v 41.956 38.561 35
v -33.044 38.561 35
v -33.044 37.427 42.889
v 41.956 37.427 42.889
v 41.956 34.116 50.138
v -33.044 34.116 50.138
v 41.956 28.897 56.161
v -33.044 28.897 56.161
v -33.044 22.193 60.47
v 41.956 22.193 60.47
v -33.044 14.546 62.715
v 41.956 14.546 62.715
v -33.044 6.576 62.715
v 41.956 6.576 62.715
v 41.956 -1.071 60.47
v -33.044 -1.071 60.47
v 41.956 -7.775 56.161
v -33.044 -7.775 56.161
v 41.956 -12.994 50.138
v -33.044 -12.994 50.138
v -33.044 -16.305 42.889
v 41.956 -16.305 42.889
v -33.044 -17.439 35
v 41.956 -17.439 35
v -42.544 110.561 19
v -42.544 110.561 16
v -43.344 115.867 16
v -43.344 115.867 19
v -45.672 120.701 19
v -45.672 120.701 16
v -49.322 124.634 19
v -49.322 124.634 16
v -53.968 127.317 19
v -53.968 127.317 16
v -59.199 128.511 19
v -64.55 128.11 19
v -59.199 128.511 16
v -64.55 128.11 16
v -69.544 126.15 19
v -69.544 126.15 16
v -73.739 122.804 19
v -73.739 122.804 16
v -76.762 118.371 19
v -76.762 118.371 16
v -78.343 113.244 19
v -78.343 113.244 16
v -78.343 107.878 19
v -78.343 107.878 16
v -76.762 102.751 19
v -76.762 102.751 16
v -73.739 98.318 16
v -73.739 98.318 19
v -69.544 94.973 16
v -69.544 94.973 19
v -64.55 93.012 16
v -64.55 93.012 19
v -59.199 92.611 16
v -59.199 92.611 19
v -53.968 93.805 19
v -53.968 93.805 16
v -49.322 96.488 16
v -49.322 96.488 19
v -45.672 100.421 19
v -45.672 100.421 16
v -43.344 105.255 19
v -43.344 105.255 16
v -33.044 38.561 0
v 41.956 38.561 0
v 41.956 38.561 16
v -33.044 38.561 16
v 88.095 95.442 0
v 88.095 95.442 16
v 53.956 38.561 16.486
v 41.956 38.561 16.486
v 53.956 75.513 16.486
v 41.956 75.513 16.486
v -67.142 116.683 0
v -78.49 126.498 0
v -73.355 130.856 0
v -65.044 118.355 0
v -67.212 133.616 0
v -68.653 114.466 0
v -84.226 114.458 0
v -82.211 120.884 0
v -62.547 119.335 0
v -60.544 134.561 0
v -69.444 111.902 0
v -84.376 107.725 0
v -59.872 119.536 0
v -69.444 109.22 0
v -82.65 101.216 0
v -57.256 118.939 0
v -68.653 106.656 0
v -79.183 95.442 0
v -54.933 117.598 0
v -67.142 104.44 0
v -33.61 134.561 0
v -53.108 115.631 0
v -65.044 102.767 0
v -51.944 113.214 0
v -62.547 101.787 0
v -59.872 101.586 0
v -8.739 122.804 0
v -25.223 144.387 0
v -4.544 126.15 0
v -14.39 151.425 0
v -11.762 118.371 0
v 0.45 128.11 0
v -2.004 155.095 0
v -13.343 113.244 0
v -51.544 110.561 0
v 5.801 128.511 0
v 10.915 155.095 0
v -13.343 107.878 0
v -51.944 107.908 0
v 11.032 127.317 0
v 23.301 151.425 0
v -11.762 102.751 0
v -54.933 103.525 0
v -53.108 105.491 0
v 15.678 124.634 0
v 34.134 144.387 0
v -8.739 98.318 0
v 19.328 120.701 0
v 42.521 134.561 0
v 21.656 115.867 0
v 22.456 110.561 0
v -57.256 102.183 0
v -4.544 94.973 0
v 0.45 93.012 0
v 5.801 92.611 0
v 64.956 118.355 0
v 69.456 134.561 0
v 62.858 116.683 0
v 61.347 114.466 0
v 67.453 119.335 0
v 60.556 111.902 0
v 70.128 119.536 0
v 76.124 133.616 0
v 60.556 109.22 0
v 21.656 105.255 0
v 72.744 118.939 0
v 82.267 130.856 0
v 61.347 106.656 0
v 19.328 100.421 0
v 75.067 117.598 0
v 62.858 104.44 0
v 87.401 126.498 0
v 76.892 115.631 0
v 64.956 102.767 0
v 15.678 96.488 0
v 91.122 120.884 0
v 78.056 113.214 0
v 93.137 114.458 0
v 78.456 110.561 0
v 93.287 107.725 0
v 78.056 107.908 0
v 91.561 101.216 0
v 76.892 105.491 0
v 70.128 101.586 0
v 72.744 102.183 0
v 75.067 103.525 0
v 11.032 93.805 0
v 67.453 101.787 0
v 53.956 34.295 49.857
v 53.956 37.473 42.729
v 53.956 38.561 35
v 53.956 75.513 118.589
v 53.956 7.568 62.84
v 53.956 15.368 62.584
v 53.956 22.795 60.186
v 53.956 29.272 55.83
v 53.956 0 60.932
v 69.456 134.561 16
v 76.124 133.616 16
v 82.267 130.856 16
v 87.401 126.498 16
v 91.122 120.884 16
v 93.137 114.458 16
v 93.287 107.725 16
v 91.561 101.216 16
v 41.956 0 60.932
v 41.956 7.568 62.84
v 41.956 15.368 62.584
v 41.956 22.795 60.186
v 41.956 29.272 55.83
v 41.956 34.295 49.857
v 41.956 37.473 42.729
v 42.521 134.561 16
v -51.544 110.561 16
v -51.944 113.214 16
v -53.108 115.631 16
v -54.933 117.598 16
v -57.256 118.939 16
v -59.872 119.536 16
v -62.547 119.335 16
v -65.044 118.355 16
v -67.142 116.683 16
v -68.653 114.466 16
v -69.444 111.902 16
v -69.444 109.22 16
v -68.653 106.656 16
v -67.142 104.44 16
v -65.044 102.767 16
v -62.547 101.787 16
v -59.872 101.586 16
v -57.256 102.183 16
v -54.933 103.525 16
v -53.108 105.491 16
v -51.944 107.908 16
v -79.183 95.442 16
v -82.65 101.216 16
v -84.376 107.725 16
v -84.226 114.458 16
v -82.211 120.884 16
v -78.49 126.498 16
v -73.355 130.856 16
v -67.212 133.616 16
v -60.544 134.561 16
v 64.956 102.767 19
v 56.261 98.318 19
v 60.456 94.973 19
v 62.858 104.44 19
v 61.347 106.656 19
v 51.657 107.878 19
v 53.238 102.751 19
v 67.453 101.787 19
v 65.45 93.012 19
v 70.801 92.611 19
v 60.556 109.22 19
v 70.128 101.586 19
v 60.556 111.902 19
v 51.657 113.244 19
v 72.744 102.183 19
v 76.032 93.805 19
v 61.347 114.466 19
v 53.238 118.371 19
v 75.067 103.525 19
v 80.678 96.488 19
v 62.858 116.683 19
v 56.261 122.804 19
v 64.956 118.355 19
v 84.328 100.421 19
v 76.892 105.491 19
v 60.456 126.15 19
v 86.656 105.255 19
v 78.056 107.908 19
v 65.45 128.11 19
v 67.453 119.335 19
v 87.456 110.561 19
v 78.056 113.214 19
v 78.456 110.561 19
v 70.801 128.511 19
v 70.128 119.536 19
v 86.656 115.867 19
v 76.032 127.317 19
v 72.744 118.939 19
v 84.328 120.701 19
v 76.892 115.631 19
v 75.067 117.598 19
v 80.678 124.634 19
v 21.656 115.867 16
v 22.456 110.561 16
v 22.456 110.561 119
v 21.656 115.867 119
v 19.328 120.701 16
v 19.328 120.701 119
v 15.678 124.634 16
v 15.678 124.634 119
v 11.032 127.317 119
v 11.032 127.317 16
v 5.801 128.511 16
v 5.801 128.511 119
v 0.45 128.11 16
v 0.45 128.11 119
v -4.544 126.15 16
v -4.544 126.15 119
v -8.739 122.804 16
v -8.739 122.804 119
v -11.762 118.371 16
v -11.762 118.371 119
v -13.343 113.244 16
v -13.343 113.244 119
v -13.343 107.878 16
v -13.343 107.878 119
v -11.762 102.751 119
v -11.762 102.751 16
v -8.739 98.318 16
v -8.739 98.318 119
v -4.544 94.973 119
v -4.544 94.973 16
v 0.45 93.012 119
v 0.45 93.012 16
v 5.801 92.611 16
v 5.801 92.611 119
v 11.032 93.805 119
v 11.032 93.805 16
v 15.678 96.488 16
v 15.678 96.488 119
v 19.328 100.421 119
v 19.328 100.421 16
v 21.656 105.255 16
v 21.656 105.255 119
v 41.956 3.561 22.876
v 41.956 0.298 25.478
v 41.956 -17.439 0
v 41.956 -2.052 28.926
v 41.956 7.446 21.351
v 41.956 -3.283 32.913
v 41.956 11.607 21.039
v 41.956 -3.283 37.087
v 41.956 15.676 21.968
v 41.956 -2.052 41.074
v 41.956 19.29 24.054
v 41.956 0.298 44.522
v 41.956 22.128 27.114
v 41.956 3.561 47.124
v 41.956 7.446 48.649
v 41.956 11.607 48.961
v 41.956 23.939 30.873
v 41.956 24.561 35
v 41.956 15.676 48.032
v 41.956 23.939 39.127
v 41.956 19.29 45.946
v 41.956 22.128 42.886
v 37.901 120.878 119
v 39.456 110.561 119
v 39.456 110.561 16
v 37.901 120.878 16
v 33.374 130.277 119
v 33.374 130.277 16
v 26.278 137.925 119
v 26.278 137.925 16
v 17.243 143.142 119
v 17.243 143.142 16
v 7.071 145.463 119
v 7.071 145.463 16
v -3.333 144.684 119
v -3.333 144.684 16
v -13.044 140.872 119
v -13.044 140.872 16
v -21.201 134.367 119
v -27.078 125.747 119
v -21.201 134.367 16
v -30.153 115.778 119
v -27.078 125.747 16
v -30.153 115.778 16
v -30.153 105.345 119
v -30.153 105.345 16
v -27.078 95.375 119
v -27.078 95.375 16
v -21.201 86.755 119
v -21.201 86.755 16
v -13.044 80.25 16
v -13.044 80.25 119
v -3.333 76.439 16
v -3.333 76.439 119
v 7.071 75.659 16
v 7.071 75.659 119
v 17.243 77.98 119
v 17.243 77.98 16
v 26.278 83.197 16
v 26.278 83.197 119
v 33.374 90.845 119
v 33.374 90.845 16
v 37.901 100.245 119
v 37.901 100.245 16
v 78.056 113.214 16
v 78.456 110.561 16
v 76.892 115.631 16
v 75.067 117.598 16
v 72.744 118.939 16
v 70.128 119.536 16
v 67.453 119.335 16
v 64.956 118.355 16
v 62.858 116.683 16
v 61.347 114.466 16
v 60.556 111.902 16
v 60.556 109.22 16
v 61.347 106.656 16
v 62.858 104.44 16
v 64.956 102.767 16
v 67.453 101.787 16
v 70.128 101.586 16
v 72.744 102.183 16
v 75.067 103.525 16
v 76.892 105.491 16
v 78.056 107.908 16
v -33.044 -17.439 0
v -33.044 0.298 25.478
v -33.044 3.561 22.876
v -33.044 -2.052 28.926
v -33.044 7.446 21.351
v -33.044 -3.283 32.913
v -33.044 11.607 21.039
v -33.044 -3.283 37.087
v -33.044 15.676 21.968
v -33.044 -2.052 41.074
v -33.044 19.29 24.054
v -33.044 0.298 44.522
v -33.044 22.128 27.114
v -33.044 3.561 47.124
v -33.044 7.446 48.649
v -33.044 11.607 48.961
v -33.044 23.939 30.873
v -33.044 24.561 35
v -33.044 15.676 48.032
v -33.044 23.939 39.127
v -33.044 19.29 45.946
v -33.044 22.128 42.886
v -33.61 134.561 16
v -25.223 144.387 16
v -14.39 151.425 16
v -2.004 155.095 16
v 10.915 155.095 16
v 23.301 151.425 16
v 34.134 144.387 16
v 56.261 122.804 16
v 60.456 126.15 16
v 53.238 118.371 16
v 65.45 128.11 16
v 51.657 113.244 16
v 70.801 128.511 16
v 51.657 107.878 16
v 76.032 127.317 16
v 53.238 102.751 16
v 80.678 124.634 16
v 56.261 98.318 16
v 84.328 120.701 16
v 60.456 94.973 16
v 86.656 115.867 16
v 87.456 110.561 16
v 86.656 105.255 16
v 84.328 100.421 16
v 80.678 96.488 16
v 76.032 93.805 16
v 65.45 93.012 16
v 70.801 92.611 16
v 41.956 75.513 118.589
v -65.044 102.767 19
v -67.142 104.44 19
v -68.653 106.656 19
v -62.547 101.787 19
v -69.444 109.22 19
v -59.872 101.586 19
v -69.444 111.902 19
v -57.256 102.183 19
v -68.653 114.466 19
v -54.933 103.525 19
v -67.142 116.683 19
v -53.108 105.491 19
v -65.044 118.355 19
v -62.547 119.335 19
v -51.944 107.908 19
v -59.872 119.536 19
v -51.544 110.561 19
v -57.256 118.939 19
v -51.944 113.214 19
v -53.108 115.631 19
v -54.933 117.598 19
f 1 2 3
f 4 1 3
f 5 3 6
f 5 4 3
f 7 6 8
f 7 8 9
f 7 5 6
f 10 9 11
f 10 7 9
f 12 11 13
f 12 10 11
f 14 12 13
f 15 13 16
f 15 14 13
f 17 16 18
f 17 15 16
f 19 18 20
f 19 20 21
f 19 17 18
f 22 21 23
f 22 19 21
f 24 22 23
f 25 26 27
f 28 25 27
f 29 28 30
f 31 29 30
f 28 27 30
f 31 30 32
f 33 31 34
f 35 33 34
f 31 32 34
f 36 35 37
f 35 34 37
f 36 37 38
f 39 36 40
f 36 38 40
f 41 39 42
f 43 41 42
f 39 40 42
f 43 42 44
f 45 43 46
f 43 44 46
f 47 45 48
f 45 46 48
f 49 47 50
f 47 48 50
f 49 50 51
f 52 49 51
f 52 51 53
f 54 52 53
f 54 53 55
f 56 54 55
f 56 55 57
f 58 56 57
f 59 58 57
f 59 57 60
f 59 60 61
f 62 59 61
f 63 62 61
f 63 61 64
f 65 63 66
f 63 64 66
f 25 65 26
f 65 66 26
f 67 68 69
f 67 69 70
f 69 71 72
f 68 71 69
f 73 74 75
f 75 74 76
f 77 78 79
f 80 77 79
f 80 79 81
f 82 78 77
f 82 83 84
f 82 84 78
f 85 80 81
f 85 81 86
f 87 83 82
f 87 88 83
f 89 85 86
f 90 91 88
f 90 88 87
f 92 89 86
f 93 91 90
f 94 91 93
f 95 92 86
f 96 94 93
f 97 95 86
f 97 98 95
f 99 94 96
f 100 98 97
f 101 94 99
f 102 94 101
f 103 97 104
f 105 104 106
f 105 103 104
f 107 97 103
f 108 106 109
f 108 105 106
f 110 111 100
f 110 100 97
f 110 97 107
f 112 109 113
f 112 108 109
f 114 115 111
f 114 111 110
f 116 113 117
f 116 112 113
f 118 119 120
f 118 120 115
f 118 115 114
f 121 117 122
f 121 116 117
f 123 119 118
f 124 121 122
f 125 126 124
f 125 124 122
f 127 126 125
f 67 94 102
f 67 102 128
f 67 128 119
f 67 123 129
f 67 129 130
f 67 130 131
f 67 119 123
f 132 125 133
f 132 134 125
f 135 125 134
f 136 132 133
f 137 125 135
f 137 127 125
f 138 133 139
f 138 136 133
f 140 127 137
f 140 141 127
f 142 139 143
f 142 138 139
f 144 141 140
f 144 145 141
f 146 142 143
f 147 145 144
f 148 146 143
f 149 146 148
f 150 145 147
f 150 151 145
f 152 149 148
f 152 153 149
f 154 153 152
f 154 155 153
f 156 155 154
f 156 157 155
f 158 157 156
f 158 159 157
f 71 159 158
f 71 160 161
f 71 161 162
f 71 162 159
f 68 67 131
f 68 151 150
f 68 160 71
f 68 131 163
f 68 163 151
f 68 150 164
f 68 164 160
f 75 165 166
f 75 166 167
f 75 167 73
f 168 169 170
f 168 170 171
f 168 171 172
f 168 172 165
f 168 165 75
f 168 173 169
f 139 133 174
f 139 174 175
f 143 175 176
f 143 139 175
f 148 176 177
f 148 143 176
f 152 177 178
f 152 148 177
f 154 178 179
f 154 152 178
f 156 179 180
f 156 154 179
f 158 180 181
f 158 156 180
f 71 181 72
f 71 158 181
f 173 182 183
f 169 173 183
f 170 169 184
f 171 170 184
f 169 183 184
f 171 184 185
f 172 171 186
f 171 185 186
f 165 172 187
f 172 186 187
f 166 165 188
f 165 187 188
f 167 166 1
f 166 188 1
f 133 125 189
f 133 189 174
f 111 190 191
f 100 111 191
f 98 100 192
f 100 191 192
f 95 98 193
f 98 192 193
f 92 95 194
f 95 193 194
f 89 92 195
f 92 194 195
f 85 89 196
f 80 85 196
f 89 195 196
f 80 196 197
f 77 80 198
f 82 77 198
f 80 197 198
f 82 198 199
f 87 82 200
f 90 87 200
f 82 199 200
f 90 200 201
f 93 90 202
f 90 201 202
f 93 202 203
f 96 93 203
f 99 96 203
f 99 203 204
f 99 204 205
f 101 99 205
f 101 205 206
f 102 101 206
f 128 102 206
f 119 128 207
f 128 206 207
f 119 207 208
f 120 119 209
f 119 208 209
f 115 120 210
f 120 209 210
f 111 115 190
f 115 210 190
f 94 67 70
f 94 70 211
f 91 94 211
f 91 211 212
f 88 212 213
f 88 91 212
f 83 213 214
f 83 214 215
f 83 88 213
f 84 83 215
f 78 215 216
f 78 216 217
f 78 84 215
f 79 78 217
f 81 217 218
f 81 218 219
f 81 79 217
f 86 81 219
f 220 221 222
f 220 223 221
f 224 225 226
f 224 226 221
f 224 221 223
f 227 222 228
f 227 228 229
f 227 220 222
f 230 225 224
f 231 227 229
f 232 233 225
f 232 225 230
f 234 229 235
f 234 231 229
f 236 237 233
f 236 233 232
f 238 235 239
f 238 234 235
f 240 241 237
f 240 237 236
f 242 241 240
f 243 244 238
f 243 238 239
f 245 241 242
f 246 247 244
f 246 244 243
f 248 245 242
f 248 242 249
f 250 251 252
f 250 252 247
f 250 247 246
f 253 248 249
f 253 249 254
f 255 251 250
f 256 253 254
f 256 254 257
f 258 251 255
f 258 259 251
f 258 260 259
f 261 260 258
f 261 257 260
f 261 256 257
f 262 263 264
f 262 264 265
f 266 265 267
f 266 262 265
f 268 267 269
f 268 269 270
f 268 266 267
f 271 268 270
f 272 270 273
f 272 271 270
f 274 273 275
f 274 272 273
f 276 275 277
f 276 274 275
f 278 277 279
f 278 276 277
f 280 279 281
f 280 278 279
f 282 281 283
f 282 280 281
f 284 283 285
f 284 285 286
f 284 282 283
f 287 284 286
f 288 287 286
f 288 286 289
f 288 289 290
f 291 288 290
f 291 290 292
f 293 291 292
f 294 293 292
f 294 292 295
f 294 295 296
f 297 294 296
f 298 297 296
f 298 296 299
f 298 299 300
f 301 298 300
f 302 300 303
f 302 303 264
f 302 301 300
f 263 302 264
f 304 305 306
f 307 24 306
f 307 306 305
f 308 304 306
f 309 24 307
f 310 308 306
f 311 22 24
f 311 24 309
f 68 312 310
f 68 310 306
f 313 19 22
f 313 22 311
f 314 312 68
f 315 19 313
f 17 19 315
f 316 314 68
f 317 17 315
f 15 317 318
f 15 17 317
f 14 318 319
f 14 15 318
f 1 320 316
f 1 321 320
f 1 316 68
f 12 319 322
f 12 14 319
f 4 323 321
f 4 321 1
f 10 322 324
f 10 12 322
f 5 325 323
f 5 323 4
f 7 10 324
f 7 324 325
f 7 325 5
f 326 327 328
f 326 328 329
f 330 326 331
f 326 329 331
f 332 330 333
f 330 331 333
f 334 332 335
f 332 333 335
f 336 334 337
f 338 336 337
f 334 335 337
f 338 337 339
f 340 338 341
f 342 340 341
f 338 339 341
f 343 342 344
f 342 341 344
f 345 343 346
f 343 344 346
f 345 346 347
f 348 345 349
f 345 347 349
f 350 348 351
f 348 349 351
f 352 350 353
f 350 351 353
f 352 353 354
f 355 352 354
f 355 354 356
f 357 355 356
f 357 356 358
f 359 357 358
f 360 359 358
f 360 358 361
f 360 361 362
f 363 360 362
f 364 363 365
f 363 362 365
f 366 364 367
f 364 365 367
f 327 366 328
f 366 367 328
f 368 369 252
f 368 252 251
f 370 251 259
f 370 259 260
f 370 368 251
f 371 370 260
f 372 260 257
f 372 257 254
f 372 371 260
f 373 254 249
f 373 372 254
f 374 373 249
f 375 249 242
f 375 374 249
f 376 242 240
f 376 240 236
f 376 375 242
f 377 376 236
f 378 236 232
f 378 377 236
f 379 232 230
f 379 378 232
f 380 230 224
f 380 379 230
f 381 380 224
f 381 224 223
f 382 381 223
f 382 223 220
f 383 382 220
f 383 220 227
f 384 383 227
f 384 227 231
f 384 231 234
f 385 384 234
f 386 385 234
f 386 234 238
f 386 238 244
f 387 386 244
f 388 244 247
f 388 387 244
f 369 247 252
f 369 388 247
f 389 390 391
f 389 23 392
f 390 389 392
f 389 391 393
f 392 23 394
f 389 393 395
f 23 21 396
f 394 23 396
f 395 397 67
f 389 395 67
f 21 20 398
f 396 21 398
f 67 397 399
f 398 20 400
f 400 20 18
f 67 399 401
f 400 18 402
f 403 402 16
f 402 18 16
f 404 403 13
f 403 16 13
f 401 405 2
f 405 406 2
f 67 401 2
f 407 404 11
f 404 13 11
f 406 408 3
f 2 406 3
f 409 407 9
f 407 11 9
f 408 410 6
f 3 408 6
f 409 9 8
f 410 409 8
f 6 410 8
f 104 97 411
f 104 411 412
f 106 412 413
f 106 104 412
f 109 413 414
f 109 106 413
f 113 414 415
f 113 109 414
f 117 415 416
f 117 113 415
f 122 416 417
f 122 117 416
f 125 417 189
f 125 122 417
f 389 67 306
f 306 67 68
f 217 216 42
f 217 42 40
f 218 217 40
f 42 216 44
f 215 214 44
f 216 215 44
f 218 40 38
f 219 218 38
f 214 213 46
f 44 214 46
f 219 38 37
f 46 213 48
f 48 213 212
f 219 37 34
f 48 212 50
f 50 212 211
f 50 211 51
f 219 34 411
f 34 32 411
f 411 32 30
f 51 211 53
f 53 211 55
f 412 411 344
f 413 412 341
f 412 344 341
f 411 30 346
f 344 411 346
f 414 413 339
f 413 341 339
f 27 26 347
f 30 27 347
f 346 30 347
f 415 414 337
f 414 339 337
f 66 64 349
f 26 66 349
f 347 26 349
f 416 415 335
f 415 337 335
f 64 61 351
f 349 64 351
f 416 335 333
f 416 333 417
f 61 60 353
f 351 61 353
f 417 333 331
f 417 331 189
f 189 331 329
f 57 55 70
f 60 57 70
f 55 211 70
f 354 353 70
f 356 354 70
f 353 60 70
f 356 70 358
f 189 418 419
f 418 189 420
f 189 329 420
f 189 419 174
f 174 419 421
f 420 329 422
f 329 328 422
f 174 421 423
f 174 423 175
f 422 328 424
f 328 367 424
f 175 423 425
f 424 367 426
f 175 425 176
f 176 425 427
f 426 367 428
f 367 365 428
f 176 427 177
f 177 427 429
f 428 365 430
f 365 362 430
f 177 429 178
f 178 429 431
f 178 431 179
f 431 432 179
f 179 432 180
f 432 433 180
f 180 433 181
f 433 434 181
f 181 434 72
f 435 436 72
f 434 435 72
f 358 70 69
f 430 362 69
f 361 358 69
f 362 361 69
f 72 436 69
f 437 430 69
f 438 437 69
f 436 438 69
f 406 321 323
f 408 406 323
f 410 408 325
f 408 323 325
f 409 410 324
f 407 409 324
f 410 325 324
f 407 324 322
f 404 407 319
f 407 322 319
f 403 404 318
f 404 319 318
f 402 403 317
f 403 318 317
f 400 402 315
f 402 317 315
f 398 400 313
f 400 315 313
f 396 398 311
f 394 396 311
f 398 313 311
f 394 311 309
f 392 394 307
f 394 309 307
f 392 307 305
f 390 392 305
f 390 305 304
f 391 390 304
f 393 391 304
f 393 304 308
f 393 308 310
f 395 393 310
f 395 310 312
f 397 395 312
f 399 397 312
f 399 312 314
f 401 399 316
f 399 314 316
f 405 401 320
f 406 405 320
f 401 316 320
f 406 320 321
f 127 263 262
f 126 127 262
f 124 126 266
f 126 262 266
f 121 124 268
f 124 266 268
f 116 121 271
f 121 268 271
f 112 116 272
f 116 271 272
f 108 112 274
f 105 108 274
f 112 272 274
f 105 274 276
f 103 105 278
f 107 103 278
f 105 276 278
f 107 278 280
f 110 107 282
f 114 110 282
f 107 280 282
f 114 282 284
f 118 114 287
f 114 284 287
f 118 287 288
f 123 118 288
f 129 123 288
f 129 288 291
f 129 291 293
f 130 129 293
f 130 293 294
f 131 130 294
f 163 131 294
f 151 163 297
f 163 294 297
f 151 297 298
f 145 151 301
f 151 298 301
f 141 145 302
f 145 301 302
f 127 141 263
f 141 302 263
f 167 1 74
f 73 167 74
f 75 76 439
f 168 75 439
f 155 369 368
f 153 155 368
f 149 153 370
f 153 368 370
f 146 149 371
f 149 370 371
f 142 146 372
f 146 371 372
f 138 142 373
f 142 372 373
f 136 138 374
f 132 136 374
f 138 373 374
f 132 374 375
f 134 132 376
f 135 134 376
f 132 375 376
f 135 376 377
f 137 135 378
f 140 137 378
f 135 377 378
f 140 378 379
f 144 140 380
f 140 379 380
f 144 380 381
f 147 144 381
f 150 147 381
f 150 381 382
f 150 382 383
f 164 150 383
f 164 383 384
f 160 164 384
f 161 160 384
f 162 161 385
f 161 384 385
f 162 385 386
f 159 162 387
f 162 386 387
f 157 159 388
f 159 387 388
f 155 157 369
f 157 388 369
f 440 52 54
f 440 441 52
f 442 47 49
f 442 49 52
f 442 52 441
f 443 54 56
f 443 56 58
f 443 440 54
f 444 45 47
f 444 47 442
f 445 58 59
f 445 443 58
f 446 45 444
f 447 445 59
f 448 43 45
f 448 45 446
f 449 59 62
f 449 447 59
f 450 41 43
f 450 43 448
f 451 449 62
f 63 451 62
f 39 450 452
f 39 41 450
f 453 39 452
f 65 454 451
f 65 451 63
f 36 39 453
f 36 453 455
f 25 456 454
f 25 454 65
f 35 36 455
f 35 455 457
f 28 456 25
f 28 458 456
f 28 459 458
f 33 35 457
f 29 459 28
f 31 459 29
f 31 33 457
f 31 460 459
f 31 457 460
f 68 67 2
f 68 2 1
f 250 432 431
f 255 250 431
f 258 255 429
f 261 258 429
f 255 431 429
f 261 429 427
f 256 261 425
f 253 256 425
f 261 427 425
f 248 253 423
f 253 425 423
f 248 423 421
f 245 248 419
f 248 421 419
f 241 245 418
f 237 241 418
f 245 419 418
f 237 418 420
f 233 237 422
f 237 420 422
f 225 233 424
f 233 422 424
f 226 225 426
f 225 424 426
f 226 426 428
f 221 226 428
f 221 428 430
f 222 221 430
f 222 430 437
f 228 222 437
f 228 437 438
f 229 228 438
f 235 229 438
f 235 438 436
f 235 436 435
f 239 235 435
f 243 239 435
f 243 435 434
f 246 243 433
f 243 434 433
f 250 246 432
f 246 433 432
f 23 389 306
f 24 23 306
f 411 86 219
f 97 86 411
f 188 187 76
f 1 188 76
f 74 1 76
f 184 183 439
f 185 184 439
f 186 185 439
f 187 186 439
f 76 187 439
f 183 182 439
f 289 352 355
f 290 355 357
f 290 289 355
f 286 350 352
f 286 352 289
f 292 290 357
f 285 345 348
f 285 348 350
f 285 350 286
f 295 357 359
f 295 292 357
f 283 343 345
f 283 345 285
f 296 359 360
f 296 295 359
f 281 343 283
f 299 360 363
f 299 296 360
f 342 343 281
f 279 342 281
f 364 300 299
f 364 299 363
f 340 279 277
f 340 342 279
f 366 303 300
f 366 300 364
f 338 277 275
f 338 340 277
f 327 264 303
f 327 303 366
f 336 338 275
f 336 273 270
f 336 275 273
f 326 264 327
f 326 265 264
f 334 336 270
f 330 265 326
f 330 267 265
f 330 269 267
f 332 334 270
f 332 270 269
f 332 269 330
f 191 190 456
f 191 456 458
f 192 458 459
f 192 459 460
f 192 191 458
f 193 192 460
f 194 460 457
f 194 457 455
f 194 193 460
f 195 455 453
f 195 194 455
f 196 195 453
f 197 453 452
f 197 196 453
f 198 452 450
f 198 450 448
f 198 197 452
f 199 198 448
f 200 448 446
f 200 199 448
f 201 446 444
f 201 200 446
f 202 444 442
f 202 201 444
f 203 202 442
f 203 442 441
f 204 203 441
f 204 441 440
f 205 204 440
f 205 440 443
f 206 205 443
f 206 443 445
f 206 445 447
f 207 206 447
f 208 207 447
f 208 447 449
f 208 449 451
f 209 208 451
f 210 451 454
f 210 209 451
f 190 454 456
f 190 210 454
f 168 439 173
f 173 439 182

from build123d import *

# Parameters (mm, degrees)
F0_W      = 75
F0_H      = 56
F1_DEPTH  = 35
F3_DEPTH  = 16
F4_R      = 18
F4_R_2    = 9
F5_DEPTH  = 3
F6_DEPTH  = 16
F7_R      = 35
F7_R_2    = 18
F8_DEPTH  = 103
F9_DEPTH  = 16
F11_DEPTH = 75
F12_R     = 14
F13_DEPTH = 75
F15_DEPTH = 12


with BuildPart() as f1:
    # F0 (on Top) → F1 (new body)
    with BuildSketch(Plane.XY):
        with Locations((4.455591552, 10.561077265)):
            Rectangle(F0_W, F0_H)
    extrude(amount=F1_DEPTH)

    # F10 (on face) → F11 (join)
    with BuildSketch(Plane.YZ.offset(41.955591552)):
        with BuildLine():
            ThreePointArc((38.561077265, 35), (10.561077265, 63), (-17.438922735, 35))
            Line((-17.438922735, 35), (38.561077265, 35))
        make_face()
    extrude(amount=-F11_DEPTH)

    # F12 (on face) → F13 (cut, through all)
    with BuildSketch(Plane.YZ.offset(41.955591552)):
        with Locations((10.561077265, 35)):
            Circle(F12_R)
    extrude(amount=-F13_DEPTH, mode=Mode.SUBTRACT)


with BuildPart() as f3:
    # F2 (on face) → F3 (new body)
    with BuildSketch(Plane(origin=(0, 0, 0), x_dir=(1, 0, 0), z_dir=(0, 0, -1))):
        with BuildLine():
            Line((-60.544408448, -134.561077265), (-33.6101410694, -134.561077265))
            ThreePointArc((-33.6101410694, -134.561077265), (4.455591552, -155.561077265), (42.5213241733, -134.561077265))
            Line((42.5213241733, -134.561077265), (69.455591552, -134.561077265))
            ThreePointArc((69.455591552, -134.561077265), (91.121899563, -120.8844050798), (88.0946248964, -95.4420020293))
            Line((88.0946248964, -95.4420020293), (41.955591552, -38.561077265))
            Line((41.955591552, -38.561077265), (-33.044408448, -38.561077265))
            Line((-33.044408448, -38.561077265), (-79.1834417925, -95.4420020293))
            ThreePointArc((-79.1834417925, -95.4420020293), (-82.2107164591, -120.8844050798), (-60.544408448, -134.561077265))
        make_face()
    extrude(amount=-F3_DEPTH)

    # F4 (on face) → F5 (join)
    with BuildSketch(Plane.XY.offset(16)):
        with Locations((-60.544408448, 110.561077265)):
            Circle(F4_R)
        with Locations((-60.544408448, 110.561077265)):
            Circle(F4_R_2, mode=Mode.SUBTRACT)
        with Locations((69.455591552, 110.561077265)):
            Circle(F4_R)
        with Locations((69.455591552, 110.561077265)):
            Circle(F4_R_2, mode=Mode.SUBTRACT)
    extrude(amount=F5_DEPTH)

    # F6 (cut, through all): faces of the model
    f6_faces = [f3.faces().sort_by_distance(p)[0] for p in [
        (-60.544408448, 110.561077265, 16),
        (69.455591552, 110.561077265, 16),
    ]]
    extrude(f6_faces, amount=-F6_DEPTH, mode=Mode.SUBTRACT)

    # F7 (on face) → F8 (join)
    with BuildSketch(Plane.XY.offset(16)):
        with Locations((4.455591552, 110.561077265)):
            Circle(F7_R)
        with Locations((4.455591552, 110.561077265)):
            Circle(F7_R_2, mode=Mode.SUBTRACT)
    extrude(amount=F8_DEPTH)

    # F9 (cut, through all): a face of the model
    f9_faces = [f3.faces().sort_by_distance(p)[0] for p in [
        (4.455591552, 110.561077265, 16),
    ]]
    extrude(f9_faces, amount=-F9_DEPTH, mode=Mode.SUBTRACT)


with BuildPart() as f15:
    # F14 (on face) → F15 (new body)
    with BuildSketch(Plane.YZ.offset(41.955591552)):
        with BuildLine():
            Line((75.5127221346, 118.5893565416), (0, 60.9319040373))
            ThreePointArc((0, 60.9319040373), (26.1862146497, 58.2347817229), (38.561077265, 35))
            Line((38.561077265, 35), (38.561077265, 16.485825181))
            Line((38.561077265, 16.485825181), (75.5127221346, 16.485825181))
            Line((75.5127221346, 16.485825181), (75.5127221346, 118.5893565416))
        make_face()
    extrude(amount=F15_DEPTH)


solid = Compound([f1.part, f3.part, f15.part])
